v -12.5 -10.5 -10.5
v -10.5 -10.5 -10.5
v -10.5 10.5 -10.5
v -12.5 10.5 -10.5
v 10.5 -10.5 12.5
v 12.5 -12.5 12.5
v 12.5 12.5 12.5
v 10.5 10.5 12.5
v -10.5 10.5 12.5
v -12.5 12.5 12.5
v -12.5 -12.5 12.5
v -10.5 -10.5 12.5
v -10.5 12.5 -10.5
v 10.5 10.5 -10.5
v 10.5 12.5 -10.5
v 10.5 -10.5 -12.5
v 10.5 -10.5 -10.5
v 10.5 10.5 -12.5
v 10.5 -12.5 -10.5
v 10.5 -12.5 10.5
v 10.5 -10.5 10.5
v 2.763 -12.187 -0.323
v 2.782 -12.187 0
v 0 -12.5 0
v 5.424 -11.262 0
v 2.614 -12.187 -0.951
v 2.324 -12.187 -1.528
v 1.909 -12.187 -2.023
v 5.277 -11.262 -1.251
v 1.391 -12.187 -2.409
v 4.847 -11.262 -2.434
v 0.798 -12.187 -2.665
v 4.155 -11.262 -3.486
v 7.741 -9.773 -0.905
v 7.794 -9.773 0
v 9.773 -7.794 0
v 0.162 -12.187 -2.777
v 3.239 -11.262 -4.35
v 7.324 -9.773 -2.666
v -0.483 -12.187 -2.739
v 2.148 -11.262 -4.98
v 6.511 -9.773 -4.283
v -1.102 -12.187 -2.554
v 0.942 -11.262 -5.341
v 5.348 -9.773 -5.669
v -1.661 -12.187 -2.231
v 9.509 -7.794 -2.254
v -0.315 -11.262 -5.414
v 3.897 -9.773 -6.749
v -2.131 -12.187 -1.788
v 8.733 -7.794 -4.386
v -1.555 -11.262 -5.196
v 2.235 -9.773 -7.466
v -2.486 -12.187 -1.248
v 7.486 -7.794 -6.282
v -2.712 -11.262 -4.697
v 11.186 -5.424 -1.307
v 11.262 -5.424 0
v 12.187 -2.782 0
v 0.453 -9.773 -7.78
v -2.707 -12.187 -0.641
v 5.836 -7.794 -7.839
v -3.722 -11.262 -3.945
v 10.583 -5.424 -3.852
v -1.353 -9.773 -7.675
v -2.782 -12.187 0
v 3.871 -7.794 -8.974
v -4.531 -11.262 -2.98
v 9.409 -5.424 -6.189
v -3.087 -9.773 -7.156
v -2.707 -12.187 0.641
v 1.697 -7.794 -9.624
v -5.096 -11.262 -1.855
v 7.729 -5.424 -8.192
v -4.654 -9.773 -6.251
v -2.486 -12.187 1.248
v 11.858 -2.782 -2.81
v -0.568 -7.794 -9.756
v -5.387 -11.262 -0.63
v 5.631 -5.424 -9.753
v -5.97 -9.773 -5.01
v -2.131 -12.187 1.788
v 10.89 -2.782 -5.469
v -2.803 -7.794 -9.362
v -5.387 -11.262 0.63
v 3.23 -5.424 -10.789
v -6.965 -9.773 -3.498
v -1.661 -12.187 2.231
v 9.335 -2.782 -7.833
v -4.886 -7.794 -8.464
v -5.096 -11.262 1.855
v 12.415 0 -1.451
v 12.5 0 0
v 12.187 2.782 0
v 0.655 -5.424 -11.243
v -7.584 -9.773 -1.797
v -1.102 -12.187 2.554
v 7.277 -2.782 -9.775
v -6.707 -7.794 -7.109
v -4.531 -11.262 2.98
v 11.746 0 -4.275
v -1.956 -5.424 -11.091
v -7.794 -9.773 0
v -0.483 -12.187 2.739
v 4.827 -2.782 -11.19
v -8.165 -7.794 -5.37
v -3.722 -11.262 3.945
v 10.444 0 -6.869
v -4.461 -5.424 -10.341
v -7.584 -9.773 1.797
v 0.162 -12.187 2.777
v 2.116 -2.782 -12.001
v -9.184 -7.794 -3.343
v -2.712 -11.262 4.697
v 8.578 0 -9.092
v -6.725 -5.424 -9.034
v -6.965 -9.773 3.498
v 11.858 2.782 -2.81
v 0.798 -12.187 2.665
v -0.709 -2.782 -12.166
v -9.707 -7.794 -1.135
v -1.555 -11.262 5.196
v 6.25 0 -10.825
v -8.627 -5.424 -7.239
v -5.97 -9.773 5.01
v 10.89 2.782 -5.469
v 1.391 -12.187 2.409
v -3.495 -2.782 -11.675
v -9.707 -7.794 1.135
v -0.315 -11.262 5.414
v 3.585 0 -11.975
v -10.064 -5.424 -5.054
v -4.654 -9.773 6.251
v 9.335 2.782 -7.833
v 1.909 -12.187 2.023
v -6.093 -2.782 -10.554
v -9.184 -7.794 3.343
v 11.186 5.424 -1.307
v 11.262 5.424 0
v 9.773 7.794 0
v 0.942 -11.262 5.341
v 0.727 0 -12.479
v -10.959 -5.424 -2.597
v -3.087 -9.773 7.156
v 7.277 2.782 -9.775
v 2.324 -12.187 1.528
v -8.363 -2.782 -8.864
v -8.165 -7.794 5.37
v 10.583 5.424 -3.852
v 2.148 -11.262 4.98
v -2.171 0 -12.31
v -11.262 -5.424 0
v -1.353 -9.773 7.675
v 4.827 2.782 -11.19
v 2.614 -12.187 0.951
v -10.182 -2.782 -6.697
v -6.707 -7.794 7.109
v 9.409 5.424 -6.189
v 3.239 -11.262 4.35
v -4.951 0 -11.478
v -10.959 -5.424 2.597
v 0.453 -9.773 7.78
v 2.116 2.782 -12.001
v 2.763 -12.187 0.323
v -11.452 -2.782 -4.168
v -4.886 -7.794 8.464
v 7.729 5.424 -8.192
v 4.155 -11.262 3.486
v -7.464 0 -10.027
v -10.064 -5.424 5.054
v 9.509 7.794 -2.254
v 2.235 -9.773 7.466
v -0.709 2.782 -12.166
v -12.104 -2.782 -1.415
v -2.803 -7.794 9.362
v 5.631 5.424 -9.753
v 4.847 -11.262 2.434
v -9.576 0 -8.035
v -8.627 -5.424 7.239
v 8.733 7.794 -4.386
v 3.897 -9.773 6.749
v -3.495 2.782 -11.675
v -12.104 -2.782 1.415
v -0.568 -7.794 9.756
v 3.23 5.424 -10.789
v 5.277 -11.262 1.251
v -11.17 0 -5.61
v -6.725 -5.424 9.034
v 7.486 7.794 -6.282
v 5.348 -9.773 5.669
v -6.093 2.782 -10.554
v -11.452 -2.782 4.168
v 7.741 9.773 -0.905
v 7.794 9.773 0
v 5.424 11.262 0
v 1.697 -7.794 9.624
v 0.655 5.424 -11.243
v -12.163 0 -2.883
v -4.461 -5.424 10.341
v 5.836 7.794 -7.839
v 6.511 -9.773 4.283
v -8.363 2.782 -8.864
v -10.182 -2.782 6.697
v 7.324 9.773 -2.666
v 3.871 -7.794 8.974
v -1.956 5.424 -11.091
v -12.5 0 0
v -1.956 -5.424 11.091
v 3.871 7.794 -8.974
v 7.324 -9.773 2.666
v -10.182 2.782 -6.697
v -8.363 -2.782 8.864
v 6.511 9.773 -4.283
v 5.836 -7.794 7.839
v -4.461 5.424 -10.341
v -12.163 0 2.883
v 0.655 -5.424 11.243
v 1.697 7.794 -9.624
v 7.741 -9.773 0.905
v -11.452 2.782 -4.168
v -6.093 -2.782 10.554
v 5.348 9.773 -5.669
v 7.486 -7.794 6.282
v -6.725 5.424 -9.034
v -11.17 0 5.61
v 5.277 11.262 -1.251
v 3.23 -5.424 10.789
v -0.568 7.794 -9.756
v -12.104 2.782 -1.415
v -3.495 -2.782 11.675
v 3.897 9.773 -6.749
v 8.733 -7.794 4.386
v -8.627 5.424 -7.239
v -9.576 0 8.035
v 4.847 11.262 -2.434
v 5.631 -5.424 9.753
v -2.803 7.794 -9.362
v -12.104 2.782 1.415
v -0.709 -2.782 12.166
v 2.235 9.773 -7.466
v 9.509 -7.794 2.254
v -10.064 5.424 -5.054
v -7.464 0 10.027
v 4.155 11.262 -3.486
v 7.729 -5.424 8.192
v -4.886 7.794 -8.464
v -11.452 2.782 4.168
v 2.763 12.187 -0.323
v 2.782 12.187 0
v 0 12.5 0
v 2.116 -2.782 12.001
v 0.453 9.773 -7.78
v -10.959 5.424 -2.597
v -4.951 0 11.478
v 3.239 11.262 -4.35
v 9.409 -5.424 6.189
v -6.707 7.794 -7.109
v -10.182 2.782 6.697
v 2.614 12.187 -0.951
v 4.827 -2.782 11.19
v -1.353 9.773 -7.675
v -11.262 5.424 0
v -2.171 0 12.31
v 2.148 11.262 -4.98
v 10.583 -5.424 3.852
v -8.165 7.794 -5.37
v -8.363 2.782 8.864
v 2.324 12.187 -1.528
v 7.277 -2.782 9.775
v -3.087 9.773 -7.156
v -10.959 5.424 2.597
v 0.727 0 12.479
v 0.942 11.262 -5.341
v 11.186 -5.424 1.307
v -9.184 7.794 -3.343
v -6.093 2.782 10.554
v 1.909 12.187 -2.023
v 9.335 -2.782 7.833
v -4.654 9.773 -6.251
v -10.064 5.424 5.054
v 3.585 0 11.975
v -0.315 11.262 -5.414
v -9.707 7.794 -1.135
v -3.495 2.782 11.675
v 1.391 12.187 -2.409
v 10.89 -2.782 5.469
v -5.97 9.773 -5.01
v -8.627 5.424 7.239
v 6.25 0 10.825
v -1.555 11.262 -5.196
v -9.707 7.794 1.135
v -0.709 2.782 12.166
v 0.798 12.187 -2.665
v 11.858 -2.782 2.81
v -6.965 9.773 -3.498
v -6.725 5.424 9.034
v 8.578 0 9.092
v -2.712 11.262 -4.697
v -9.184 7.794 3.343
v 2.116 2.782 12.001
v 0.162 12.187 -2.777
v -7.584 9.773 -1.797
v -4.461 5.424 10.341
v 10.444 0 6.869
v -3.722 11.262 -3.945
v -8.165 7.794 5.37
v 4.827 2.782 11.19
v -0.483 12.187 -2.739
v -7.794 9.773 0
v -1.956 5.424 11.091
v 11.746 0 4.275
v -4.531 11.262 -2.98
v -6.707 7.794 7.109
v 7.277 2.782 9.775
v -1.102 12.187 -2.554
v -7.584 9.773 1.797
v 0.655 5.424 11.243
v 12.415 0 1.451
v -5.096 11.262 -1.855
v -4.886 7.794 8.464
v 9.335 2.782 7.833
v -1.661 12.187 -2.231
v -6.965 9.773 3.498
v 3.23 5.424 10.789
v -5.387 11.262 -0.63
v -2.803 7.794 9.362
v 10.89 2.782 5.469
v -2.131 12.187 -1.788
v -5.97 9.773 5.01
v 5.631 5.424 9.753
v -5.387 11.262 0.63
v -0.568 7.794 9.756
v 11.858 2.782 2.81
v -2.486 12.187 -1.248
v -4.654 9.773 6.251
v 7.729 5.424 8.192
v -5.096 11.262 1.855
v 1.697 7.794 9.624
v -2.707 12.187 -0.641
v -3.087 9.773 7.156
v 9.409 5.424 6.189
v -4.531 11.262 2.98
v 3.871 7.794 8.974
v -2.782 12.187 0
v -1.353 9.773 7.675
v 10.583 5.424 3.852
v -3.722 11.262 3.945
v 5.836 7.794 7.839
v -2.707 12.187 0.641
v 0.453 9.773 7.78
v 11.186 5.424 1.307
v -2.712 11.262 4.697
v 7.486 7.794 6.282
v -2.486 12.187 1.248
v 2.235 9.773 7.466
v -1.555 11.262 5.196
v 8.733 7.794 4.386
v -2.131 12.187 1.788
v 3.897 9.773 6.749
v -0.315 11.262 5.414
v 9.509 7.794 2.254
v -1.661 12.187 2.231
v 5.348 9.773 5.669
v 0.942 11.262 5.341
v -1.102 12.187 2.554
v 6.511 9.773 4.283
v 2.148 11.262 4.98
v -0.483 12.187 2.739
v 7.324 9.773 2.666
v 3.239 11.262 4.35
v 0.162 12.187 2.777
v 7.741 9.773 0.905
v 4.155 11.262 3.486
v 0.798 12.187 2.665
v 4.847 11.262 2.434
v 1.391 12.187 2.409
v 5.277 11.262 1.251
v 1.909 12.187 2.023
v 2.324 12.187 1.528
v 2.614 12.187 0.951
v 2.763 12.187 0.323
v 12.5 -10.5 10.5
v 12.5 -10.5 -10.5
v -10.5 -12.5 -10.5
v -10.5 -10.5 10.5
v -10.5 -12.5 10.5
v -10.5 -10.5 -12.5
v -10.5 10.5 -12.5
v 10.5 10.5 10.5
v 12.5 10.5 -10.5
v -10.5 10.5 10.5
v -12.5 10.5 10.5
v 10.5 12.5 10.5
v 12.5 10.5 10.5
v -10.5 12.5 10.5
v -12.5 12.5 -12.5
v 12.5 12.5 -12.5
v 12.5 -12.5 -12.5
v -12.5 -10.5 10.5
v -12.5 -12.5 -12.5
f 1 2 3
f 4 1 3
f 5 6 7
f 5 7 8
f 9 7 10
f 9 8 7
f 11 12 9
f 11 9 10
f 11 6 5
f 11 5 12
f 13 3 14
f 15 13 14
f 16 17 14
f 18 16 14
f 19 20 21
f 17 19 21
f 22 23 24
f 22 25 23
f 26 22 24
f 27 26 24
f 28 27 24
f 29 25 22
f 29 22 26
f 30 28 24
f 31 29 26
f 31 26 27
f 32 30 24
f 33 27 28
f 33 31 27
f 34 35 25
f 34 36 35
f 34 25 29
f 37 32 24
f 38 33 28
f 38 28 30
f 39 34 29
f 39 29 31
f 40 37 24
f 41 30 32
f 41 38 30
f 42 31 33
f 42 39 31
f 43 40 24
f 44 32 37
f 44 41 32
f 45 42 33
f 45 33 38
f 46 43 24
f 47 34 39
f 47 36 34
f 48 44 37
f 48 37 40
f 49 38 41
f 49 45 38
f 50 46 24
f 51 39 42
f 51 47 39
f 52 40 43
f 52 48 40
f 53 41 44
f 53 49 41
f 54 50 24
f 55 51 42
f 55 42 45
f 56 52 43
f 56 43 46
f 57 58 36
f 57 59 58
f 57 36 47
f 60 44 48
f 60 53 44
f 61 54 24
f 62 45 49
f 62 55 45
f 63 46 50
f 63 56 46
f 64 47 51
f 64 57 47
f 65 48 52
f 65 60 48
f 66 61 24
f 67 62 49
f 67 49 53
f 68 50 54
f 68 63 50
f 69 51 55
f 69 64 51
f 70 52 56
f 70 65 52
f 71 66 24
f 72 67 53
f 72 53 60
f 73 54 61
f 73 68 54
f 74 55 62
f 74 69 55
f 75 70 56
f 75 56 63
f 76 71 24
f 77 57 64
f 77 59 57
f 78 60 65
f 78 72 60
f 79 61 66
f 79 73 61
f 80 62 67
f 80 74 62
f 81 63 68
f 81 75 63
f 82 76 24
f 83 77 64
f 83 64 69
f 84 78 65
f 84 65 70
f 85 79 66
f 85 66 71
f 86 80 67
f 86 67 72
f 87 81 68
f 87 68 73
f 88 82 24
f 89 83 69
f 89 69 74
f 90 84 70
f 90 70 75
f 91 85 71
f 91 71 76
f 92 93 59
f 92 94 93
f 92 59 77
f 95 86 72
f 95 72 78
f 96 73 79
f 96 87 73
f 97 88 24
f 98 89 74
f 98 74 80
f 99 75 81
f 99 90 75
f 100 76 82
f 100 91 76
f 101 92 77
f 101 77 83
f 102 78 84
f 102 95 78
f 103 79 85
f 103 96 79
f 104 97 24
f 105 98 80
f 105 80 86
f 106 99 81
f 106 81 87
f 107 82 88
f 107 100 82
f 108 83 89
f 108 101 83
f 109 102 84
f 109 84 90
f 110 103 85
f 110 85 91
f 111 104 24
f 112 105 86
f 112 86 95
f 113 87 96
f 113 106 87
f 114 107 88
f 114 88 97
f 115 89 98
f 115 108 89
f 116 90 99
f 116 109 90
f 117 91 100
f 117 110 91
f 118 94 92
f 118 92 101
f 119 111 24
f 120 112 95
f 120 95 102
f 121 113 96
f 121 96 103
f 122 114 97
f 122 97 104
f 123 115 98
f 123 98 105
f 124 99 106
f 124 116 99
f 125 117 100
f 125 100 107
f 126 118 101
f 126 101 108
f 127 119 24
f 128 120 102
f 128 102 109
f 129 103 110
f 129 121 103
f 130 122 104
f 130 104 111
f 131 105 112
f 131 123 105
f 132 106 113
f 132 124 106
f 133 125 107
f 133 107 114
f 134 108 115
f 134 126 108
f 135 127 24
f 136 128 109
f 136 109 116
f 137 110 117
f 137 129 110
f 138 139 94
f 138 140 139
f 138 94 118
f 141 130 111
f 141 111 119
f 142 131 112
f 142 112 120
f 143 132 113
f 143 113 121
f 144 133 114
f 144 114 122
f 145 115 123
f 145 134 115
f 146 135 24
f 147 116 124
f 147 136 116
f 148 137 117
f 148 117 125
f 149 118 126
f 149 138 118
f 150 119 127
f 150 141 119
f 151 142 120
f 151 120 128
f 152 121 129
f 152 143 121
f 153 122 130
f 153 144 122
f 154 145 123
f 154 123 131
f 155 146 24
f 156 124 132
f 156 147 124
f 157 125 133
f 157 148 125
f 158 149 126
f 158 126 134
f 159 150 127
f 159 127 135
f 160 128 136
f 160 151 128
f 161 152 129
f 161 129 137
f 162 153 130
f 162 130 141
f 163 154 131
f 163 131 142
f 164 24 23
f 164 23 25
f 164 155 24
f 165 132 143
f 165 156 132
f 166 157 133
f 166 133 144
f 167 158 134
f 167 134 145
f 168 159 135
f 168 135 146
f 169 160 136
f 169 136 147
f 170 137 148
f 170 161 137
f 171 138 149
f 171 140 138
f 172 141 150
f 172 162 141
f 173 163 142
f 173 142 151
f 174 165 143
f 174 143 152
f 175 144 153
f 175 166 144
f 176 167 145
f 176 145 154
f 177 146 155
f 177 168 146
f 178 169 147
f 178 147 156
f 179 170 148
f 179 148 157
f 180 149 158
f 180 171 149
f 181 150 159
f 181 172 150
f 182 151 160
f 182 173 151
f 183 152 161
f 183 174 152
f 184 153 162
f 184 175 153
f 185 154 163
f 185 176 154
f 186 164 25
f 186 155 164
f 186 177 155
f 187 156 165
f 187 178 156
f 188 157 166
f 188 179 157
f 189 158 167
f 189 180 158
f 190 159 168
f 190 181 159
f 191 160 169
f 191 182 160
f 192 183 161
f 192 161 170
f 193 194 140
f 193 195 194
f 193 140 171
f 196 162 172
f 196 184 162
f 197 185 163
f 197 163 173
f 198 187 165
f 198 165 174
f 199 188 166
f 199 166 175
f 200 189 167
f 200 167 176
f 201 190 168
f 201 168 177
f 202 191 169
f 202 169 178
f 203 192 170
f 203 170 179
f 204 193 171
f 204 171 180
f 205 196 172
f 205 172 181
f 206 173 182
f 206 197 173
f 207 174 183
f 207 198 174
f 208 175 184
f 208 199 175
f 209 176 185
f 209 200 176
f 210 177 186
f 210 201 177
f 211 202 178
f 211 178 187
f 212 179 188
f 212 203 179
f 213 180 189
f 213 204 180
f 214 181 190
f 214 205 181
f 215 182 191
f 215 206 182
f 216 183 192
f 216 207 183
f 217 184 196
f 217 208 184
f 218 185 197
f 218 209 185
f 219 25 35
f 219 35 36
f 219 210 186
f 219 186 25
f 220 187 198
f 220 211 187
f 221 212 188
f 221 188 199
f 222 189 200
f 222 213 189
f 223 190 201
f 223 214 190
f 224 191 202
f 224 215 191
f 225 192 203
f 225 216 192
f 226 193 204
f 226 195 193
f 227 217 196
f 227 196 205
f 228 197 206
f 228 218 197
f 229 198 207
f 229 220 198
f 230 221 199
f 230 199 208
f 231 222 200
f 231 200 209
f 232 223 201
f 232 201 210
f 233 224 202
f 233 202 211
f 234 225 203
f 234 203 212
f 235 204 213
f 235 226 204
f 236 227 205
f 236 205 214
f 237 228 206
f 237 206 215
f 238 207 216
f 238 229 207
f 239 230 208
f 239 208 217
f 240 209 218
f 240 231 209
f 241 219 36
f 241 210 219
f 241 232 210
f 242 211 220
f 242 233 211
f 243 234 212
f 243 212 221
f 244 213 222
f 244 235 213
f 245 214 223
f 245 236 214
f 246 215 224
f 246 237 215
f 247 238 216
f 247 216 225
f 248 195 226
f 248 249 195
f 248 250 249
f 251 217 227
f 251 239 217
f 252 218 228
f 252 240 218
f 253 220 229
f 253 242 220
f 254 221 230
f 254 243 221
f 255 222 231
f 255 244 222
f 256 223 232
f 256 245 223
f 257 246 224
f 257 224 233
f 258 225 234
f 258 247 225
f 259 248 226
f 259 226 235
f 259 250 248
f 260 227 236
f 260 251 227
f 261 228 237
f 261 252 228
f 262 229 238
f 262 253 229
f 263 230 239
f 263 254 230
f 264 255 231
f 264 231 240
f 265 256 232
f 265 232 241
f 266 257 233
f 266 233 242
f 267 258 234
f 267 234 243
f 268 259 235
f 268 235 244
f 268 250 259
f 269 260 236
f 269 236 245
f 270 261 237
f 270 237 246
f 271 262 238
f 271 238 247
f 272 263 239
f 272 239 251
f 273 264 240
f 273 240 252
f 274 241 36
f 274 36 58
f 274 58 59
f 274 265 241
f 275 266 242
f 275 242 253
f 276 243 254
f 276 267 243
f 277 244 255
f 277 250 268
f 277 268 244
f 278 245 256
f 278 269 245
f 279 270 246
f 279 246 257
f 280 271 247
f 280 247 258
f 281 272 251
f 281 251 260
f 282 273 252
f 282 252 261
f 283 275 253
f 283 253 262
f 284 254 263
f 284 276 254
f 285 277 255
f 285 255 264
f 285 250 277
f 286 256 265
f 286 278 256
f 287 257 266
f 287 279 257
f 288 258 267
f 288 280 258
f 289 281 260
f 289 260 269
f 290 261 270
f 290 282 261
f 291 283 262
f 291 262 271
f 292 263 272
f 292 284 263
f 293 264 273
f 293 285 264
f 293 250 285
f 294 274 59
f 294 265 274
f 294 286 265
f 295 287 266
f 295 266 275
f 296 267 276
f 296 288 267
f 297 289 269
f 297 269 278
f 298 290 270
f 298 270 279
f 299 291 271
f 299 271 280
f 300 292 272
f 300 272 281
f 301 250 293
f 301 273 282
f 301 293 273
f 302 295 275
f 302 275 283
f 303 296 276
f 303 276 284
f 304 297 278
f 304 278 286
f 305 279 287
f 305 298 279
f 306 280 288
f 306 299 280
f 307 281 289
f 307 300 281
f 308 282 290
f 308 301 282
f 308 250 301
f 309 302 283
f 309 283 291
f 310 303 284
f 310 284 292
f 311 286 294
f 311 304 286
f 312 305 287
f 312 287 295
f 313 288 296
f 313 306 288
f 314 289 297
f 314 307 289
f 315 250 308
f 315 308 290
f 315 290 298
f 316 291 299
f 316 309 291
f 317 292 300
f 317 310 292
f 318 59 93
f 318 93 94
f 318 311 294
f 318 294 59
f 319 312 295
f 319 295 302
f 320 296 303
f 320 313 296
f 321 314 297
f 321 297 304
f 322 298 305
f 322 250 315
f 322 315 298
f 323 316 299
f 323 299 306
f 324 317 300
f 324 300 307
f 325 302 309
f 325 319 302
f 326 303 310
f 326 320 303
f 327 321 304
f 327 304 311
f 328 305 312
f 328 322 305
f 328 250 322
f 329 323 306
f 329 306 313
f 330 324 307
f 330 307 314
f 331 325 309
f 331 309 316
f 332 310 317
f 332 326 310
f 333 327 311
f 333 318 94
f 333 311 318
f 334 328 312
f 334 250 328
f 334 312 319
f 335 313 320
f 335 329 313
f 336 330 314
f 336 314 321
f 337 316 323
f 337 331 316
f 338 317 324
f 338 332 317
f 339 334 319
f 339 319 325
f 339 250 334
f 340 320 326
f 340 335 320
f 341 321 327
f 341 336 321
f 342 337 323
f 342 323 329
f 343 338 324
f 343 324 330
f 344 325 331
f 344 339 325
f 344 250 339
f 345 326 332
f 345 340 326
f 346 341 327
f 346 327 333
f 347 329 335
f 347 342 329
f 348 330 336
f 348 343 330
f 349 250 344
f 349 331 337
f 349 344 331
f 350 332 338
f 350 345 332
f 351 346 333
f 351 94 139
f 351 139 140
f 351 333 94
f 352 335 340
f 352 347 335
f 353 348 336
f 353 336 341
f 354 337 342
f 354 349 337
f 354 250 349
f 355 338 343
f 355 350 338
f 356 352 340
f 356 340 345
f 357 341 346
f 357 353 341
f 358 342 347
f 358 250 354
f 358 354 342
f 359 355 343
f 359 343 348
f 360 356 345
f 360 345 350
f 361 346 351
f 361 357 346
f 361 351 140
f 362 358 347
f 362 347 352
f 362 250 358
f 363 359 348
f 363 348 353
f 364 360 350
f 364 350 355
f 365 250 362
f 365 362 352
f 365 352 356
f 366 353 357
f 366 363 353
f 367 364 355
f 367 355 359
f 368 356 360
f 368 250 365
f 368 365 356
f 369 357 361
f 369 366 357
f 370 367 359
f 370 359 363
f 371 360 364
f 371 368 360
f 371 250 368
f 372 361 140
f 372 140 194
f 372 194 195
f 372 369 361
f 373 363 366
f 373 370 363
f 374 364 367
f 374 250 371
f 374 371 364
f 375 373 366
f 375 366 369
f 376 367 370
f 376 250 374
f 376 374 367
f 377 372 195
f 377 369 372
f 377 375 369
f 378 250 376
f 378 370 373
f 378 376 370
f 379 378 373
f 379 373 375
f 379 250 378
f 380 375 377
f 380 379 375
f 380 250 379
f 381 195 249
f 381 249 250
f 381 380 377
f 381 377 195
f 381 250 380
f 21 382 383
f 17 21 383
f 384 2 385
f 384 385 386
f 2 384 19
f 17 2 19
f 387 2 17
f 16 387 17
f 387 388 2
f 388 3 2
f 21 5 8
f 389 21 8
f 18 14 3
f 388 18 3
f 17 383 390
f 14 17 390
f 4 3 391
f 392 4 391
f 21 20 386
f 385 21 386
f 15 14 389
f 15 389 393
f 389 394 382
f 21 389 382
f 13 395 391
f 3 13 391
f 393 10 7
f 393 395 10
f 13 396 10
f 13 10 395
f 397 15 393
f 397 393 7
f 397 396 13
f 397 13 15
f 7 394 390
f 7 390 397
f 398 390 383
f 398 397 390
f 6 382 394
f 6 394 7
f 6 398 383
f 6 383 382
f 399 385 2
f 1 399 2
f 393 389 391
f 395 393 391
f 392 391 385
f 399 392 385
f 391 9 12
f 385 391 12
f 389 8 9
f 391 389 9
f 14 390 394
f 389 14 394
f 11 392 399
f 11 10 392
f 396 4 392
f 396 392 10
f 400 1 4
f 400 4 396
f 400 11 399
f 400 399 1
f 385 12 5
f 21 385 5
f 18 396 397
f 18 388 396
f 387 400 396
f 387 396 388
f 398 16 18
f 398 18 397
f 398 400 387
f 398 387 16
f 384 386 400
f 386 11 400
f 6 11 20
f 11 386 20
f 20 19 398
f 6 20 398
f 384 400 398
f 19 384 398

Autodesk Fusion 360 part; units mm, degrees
sketch "Sketch1" plane through (0, 0, 0) normal (0, 1, 0) x (1, 0, 0)
  line L0 (12.5, -12.5) -> (-12.5, -12.5)
  line L1 (-12.5, -12.5) -> (-12.5, 12.5)
  line L2 (-12.5, 12.5) -> (12.5, 12.5)
  line L3 (12.5, 12.5) -> (12.5, -12.5)
  line L4 (12.5, -12.5) -> (-12.5, 12.5) construction
  line L5 (-12.5, -12.5) -> (12.5, 12.5) construction
  dimension "d1" = 25
  dimension "d2" = 25
extrude "Extrude1" add sketch "Sketch1" along normal mid plane 25 makes body 1
sketch "Sketch2" plane through (0, -12.5, 0) normal (0, -1, 0) x (1, 0, 0)
  line L0 (-12.5, -12.5) -> (12.5, -12.5)
  line L1 (12.5, -12.5) -> (12.5, 12.5)
  line L2 (12.5, 12.5) -> (-12.5, 12.5)
  line L3 (-12.5, 12.5) -> (-12.5, -12.5)
  line L4 (-10.5, -10.5) -> (10.5, -10.5)
  line L5 (10.5, -10.5) -> (10.5, 10.5)
  line L6 (10.5, 10.5) -> (-10.5, 10.5)
  line L7 (-10.5, 10.5) -> (-10.5, -10.5)
  dimension "d6" = -2
extrude "Extrude2" cut sketch "Sketch2" against normal blind 45 contours L4 L5 L6 L7 bodies 1
sketch "Sketch3" plane through (0, 0, 12.5) normal (0, 0, 1) x (-1, 0, 0)
  line L0 (12.5, 12.5) -> (-12.5, 12.5)
  line L1 (-12.5, 12.5) -> (-12.5, -12.5)
  line L2 (-12.5, -12.5) -> (12.5, -12.5)
  line L3 (12.5, -12.5) -> (12.5, 12.5)
  line L4 (10.5, 10.5) -> (-10.5, 10.5)
  line L5 (-10.5, 10.5) -> (-10.5, -10.5)
  line L6 (-10.5, -10.5) -> (10.5, -10.5)
  line L7 (10.5, -10.5) -> (10.5, 10.5)
  dimension "d9" = -2
extrude "Extrude3" cut sketch "Sketch3" against normal blind 41 contours L4 L5 L6 L7 bodies 1
sketch "Sketch4" plane through (12.5, 0, 0) normal (1, 0, 0) x (0, 1, 0)
  line L0 (-12.5, 12.5) -> (-12.5, -12.5)
  line L1 (-12.5, -12.5) -> (12.5, -12.5)
  line L2 (12.5, -12.5) -> (12.5, 12.5)
  line L3 (12.5, 12.5) -> (-12.5, 12.5)
  line L4 (-10.5, -10.5) -> (10.5, -10.5)
  line L5 (10.5, -10.5) -> (10.5, 10.5)
  line L6 (10.5, 10.5) -> (-10.5, 10.5)
  line L7 (-10.5, 10.5) -> (-10.5, -10.5)
  dimension "d12" = -2
extrude "Extrude4" cut sketch "Sketch4" against normal blind 38 contours L4 L5 L6 L7 bodies 1
sketch "Sketch5" plane through (0, 0, 0) normal (0, 1, 0) x (1, 0, 0)
sphere "SpherePrimitive1" add diameter 25 placed x (1, 0, 0) y (0, 0, -1) z (0, 1, 0) at (0, 0, 0) separate body makes body 2
equation "d3 = 25 mm / 2"
